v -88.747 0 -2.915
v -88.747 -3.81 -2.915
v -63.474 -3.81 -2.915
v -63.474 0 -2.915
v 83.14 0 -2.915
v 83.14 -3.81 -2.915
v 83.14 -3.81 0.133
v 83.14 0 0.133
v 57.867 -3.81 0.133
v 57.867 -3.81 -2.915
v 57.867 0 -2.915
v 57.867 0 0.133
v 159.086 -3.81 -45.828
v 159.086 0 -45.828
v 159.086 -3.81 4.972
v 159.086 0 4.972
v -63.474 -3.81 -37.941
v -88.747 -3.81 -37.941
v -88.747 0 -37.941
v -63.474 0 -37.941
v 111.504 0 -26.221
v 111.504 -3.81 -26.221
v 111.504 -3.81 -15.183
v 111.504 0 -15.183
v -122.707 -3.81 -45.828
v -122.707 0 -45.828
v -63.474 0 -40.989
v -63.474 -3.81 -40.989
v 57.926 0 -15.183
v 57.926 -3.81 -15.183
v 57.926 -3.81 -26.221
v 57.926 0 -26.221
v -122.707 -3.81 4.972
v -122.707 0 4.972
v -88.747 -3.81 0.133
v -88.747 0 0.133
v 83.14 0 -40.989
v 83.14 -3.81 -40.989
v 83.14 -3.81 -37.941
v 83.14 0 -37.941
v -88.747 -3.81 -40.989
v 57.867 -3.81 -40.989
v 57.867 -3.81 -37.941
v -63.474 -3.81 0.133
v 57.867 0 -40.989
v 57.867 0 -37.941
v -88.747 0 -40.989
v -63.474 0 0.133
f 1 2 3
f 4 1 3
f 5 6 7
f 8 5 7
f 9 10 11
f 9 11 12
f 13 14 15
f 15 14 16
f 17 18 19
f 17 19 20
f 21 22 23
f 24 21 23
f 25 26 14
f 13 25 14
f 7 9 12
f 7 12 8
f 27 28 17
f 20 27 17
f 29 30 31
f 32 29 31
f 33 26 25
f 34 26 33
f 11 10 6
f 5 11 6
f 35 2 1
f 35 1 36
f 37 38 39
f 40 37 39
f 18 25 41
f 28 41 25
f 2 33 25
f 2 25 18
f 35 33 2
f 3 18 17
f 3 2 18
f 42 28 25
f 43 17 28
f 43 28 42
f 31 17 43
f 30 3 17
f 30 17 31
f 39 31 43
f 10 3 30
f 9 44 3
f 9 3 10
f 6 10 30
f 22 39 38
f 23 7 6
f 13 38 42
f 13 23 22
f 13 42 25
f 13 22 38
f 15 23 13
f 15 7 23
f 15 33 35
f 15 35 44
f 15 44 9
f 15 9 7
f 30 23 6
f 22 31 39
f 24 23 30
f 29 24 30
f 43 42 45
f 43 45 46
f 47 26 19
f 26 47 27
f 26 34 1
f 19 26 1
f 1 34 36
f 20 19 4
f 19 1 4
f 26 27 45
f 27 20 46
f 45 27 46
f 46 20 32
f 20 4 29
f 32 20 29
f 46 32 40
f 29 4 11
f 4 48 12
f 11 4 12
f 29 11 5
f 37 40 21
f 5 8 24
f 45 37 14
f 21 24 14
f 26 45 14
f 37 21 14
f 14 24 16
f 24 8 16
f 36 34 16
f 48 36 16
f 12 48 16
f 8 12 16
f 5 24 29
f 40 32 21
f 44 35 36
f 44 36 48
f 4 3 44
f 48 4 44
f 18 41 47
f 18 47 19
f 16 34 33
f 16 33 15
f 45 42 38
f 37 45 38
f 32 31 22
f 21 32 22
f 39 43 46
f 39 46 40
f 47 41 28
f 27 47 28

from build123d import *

# Parameters (mm, degrees)
F0_W     = 281.793315
F0_H     = 50.8
F1_DEPTH = 3.81
F2_W     = 25.273
F2_H     = 3.048
F3_DEPTH = 25.4
F5_DEPTH = 25.4


with BuildPart() as f1:
    # F0 (on Front) → F1 (new body)
    with BuildSketch(Plane.XZ):
        with Locations((18.189594, -20.427606)):
            Rectangle(F0_W, F0_H)
    extrude(amount=F1_DEPTH)

    # F2 (on face) → F3 (cut)
    with BuildSketch(Plane.XZ.offset(3.81)):
        with Locations((70.503751, -1.390693)):
            Rectangle(F2_W, F2_H)
        with Locations((70.503751, -39.464519)):
            Rectangle(F2_W, F2_H)
        with Locations((-76.110764, -1.390693)):
            Rectangle(F2_W, F2_H)
        with Locations((-76.110764, -39.464519)):
            Rectangle(F2_W, F2_H)
    extrude(amount=-F3_DEPTH, mode=Mode.SUBTRACT)

    # F4 (on face) → F5 (cut)
    with BuildSketch(Plane.XZ.offset(3.81)):
        Polygon((111.503996, -15.1832), (67.158138, -15.1832), (57.92642, -15.1832), (57.92642, -26.221192), (67.158138, -26.221192), (111.503996, -26.221192), align=None)
    extrude(amount=-F5_DEPTH, mode=Mode.SUBTRACT)


solid = f1.part
